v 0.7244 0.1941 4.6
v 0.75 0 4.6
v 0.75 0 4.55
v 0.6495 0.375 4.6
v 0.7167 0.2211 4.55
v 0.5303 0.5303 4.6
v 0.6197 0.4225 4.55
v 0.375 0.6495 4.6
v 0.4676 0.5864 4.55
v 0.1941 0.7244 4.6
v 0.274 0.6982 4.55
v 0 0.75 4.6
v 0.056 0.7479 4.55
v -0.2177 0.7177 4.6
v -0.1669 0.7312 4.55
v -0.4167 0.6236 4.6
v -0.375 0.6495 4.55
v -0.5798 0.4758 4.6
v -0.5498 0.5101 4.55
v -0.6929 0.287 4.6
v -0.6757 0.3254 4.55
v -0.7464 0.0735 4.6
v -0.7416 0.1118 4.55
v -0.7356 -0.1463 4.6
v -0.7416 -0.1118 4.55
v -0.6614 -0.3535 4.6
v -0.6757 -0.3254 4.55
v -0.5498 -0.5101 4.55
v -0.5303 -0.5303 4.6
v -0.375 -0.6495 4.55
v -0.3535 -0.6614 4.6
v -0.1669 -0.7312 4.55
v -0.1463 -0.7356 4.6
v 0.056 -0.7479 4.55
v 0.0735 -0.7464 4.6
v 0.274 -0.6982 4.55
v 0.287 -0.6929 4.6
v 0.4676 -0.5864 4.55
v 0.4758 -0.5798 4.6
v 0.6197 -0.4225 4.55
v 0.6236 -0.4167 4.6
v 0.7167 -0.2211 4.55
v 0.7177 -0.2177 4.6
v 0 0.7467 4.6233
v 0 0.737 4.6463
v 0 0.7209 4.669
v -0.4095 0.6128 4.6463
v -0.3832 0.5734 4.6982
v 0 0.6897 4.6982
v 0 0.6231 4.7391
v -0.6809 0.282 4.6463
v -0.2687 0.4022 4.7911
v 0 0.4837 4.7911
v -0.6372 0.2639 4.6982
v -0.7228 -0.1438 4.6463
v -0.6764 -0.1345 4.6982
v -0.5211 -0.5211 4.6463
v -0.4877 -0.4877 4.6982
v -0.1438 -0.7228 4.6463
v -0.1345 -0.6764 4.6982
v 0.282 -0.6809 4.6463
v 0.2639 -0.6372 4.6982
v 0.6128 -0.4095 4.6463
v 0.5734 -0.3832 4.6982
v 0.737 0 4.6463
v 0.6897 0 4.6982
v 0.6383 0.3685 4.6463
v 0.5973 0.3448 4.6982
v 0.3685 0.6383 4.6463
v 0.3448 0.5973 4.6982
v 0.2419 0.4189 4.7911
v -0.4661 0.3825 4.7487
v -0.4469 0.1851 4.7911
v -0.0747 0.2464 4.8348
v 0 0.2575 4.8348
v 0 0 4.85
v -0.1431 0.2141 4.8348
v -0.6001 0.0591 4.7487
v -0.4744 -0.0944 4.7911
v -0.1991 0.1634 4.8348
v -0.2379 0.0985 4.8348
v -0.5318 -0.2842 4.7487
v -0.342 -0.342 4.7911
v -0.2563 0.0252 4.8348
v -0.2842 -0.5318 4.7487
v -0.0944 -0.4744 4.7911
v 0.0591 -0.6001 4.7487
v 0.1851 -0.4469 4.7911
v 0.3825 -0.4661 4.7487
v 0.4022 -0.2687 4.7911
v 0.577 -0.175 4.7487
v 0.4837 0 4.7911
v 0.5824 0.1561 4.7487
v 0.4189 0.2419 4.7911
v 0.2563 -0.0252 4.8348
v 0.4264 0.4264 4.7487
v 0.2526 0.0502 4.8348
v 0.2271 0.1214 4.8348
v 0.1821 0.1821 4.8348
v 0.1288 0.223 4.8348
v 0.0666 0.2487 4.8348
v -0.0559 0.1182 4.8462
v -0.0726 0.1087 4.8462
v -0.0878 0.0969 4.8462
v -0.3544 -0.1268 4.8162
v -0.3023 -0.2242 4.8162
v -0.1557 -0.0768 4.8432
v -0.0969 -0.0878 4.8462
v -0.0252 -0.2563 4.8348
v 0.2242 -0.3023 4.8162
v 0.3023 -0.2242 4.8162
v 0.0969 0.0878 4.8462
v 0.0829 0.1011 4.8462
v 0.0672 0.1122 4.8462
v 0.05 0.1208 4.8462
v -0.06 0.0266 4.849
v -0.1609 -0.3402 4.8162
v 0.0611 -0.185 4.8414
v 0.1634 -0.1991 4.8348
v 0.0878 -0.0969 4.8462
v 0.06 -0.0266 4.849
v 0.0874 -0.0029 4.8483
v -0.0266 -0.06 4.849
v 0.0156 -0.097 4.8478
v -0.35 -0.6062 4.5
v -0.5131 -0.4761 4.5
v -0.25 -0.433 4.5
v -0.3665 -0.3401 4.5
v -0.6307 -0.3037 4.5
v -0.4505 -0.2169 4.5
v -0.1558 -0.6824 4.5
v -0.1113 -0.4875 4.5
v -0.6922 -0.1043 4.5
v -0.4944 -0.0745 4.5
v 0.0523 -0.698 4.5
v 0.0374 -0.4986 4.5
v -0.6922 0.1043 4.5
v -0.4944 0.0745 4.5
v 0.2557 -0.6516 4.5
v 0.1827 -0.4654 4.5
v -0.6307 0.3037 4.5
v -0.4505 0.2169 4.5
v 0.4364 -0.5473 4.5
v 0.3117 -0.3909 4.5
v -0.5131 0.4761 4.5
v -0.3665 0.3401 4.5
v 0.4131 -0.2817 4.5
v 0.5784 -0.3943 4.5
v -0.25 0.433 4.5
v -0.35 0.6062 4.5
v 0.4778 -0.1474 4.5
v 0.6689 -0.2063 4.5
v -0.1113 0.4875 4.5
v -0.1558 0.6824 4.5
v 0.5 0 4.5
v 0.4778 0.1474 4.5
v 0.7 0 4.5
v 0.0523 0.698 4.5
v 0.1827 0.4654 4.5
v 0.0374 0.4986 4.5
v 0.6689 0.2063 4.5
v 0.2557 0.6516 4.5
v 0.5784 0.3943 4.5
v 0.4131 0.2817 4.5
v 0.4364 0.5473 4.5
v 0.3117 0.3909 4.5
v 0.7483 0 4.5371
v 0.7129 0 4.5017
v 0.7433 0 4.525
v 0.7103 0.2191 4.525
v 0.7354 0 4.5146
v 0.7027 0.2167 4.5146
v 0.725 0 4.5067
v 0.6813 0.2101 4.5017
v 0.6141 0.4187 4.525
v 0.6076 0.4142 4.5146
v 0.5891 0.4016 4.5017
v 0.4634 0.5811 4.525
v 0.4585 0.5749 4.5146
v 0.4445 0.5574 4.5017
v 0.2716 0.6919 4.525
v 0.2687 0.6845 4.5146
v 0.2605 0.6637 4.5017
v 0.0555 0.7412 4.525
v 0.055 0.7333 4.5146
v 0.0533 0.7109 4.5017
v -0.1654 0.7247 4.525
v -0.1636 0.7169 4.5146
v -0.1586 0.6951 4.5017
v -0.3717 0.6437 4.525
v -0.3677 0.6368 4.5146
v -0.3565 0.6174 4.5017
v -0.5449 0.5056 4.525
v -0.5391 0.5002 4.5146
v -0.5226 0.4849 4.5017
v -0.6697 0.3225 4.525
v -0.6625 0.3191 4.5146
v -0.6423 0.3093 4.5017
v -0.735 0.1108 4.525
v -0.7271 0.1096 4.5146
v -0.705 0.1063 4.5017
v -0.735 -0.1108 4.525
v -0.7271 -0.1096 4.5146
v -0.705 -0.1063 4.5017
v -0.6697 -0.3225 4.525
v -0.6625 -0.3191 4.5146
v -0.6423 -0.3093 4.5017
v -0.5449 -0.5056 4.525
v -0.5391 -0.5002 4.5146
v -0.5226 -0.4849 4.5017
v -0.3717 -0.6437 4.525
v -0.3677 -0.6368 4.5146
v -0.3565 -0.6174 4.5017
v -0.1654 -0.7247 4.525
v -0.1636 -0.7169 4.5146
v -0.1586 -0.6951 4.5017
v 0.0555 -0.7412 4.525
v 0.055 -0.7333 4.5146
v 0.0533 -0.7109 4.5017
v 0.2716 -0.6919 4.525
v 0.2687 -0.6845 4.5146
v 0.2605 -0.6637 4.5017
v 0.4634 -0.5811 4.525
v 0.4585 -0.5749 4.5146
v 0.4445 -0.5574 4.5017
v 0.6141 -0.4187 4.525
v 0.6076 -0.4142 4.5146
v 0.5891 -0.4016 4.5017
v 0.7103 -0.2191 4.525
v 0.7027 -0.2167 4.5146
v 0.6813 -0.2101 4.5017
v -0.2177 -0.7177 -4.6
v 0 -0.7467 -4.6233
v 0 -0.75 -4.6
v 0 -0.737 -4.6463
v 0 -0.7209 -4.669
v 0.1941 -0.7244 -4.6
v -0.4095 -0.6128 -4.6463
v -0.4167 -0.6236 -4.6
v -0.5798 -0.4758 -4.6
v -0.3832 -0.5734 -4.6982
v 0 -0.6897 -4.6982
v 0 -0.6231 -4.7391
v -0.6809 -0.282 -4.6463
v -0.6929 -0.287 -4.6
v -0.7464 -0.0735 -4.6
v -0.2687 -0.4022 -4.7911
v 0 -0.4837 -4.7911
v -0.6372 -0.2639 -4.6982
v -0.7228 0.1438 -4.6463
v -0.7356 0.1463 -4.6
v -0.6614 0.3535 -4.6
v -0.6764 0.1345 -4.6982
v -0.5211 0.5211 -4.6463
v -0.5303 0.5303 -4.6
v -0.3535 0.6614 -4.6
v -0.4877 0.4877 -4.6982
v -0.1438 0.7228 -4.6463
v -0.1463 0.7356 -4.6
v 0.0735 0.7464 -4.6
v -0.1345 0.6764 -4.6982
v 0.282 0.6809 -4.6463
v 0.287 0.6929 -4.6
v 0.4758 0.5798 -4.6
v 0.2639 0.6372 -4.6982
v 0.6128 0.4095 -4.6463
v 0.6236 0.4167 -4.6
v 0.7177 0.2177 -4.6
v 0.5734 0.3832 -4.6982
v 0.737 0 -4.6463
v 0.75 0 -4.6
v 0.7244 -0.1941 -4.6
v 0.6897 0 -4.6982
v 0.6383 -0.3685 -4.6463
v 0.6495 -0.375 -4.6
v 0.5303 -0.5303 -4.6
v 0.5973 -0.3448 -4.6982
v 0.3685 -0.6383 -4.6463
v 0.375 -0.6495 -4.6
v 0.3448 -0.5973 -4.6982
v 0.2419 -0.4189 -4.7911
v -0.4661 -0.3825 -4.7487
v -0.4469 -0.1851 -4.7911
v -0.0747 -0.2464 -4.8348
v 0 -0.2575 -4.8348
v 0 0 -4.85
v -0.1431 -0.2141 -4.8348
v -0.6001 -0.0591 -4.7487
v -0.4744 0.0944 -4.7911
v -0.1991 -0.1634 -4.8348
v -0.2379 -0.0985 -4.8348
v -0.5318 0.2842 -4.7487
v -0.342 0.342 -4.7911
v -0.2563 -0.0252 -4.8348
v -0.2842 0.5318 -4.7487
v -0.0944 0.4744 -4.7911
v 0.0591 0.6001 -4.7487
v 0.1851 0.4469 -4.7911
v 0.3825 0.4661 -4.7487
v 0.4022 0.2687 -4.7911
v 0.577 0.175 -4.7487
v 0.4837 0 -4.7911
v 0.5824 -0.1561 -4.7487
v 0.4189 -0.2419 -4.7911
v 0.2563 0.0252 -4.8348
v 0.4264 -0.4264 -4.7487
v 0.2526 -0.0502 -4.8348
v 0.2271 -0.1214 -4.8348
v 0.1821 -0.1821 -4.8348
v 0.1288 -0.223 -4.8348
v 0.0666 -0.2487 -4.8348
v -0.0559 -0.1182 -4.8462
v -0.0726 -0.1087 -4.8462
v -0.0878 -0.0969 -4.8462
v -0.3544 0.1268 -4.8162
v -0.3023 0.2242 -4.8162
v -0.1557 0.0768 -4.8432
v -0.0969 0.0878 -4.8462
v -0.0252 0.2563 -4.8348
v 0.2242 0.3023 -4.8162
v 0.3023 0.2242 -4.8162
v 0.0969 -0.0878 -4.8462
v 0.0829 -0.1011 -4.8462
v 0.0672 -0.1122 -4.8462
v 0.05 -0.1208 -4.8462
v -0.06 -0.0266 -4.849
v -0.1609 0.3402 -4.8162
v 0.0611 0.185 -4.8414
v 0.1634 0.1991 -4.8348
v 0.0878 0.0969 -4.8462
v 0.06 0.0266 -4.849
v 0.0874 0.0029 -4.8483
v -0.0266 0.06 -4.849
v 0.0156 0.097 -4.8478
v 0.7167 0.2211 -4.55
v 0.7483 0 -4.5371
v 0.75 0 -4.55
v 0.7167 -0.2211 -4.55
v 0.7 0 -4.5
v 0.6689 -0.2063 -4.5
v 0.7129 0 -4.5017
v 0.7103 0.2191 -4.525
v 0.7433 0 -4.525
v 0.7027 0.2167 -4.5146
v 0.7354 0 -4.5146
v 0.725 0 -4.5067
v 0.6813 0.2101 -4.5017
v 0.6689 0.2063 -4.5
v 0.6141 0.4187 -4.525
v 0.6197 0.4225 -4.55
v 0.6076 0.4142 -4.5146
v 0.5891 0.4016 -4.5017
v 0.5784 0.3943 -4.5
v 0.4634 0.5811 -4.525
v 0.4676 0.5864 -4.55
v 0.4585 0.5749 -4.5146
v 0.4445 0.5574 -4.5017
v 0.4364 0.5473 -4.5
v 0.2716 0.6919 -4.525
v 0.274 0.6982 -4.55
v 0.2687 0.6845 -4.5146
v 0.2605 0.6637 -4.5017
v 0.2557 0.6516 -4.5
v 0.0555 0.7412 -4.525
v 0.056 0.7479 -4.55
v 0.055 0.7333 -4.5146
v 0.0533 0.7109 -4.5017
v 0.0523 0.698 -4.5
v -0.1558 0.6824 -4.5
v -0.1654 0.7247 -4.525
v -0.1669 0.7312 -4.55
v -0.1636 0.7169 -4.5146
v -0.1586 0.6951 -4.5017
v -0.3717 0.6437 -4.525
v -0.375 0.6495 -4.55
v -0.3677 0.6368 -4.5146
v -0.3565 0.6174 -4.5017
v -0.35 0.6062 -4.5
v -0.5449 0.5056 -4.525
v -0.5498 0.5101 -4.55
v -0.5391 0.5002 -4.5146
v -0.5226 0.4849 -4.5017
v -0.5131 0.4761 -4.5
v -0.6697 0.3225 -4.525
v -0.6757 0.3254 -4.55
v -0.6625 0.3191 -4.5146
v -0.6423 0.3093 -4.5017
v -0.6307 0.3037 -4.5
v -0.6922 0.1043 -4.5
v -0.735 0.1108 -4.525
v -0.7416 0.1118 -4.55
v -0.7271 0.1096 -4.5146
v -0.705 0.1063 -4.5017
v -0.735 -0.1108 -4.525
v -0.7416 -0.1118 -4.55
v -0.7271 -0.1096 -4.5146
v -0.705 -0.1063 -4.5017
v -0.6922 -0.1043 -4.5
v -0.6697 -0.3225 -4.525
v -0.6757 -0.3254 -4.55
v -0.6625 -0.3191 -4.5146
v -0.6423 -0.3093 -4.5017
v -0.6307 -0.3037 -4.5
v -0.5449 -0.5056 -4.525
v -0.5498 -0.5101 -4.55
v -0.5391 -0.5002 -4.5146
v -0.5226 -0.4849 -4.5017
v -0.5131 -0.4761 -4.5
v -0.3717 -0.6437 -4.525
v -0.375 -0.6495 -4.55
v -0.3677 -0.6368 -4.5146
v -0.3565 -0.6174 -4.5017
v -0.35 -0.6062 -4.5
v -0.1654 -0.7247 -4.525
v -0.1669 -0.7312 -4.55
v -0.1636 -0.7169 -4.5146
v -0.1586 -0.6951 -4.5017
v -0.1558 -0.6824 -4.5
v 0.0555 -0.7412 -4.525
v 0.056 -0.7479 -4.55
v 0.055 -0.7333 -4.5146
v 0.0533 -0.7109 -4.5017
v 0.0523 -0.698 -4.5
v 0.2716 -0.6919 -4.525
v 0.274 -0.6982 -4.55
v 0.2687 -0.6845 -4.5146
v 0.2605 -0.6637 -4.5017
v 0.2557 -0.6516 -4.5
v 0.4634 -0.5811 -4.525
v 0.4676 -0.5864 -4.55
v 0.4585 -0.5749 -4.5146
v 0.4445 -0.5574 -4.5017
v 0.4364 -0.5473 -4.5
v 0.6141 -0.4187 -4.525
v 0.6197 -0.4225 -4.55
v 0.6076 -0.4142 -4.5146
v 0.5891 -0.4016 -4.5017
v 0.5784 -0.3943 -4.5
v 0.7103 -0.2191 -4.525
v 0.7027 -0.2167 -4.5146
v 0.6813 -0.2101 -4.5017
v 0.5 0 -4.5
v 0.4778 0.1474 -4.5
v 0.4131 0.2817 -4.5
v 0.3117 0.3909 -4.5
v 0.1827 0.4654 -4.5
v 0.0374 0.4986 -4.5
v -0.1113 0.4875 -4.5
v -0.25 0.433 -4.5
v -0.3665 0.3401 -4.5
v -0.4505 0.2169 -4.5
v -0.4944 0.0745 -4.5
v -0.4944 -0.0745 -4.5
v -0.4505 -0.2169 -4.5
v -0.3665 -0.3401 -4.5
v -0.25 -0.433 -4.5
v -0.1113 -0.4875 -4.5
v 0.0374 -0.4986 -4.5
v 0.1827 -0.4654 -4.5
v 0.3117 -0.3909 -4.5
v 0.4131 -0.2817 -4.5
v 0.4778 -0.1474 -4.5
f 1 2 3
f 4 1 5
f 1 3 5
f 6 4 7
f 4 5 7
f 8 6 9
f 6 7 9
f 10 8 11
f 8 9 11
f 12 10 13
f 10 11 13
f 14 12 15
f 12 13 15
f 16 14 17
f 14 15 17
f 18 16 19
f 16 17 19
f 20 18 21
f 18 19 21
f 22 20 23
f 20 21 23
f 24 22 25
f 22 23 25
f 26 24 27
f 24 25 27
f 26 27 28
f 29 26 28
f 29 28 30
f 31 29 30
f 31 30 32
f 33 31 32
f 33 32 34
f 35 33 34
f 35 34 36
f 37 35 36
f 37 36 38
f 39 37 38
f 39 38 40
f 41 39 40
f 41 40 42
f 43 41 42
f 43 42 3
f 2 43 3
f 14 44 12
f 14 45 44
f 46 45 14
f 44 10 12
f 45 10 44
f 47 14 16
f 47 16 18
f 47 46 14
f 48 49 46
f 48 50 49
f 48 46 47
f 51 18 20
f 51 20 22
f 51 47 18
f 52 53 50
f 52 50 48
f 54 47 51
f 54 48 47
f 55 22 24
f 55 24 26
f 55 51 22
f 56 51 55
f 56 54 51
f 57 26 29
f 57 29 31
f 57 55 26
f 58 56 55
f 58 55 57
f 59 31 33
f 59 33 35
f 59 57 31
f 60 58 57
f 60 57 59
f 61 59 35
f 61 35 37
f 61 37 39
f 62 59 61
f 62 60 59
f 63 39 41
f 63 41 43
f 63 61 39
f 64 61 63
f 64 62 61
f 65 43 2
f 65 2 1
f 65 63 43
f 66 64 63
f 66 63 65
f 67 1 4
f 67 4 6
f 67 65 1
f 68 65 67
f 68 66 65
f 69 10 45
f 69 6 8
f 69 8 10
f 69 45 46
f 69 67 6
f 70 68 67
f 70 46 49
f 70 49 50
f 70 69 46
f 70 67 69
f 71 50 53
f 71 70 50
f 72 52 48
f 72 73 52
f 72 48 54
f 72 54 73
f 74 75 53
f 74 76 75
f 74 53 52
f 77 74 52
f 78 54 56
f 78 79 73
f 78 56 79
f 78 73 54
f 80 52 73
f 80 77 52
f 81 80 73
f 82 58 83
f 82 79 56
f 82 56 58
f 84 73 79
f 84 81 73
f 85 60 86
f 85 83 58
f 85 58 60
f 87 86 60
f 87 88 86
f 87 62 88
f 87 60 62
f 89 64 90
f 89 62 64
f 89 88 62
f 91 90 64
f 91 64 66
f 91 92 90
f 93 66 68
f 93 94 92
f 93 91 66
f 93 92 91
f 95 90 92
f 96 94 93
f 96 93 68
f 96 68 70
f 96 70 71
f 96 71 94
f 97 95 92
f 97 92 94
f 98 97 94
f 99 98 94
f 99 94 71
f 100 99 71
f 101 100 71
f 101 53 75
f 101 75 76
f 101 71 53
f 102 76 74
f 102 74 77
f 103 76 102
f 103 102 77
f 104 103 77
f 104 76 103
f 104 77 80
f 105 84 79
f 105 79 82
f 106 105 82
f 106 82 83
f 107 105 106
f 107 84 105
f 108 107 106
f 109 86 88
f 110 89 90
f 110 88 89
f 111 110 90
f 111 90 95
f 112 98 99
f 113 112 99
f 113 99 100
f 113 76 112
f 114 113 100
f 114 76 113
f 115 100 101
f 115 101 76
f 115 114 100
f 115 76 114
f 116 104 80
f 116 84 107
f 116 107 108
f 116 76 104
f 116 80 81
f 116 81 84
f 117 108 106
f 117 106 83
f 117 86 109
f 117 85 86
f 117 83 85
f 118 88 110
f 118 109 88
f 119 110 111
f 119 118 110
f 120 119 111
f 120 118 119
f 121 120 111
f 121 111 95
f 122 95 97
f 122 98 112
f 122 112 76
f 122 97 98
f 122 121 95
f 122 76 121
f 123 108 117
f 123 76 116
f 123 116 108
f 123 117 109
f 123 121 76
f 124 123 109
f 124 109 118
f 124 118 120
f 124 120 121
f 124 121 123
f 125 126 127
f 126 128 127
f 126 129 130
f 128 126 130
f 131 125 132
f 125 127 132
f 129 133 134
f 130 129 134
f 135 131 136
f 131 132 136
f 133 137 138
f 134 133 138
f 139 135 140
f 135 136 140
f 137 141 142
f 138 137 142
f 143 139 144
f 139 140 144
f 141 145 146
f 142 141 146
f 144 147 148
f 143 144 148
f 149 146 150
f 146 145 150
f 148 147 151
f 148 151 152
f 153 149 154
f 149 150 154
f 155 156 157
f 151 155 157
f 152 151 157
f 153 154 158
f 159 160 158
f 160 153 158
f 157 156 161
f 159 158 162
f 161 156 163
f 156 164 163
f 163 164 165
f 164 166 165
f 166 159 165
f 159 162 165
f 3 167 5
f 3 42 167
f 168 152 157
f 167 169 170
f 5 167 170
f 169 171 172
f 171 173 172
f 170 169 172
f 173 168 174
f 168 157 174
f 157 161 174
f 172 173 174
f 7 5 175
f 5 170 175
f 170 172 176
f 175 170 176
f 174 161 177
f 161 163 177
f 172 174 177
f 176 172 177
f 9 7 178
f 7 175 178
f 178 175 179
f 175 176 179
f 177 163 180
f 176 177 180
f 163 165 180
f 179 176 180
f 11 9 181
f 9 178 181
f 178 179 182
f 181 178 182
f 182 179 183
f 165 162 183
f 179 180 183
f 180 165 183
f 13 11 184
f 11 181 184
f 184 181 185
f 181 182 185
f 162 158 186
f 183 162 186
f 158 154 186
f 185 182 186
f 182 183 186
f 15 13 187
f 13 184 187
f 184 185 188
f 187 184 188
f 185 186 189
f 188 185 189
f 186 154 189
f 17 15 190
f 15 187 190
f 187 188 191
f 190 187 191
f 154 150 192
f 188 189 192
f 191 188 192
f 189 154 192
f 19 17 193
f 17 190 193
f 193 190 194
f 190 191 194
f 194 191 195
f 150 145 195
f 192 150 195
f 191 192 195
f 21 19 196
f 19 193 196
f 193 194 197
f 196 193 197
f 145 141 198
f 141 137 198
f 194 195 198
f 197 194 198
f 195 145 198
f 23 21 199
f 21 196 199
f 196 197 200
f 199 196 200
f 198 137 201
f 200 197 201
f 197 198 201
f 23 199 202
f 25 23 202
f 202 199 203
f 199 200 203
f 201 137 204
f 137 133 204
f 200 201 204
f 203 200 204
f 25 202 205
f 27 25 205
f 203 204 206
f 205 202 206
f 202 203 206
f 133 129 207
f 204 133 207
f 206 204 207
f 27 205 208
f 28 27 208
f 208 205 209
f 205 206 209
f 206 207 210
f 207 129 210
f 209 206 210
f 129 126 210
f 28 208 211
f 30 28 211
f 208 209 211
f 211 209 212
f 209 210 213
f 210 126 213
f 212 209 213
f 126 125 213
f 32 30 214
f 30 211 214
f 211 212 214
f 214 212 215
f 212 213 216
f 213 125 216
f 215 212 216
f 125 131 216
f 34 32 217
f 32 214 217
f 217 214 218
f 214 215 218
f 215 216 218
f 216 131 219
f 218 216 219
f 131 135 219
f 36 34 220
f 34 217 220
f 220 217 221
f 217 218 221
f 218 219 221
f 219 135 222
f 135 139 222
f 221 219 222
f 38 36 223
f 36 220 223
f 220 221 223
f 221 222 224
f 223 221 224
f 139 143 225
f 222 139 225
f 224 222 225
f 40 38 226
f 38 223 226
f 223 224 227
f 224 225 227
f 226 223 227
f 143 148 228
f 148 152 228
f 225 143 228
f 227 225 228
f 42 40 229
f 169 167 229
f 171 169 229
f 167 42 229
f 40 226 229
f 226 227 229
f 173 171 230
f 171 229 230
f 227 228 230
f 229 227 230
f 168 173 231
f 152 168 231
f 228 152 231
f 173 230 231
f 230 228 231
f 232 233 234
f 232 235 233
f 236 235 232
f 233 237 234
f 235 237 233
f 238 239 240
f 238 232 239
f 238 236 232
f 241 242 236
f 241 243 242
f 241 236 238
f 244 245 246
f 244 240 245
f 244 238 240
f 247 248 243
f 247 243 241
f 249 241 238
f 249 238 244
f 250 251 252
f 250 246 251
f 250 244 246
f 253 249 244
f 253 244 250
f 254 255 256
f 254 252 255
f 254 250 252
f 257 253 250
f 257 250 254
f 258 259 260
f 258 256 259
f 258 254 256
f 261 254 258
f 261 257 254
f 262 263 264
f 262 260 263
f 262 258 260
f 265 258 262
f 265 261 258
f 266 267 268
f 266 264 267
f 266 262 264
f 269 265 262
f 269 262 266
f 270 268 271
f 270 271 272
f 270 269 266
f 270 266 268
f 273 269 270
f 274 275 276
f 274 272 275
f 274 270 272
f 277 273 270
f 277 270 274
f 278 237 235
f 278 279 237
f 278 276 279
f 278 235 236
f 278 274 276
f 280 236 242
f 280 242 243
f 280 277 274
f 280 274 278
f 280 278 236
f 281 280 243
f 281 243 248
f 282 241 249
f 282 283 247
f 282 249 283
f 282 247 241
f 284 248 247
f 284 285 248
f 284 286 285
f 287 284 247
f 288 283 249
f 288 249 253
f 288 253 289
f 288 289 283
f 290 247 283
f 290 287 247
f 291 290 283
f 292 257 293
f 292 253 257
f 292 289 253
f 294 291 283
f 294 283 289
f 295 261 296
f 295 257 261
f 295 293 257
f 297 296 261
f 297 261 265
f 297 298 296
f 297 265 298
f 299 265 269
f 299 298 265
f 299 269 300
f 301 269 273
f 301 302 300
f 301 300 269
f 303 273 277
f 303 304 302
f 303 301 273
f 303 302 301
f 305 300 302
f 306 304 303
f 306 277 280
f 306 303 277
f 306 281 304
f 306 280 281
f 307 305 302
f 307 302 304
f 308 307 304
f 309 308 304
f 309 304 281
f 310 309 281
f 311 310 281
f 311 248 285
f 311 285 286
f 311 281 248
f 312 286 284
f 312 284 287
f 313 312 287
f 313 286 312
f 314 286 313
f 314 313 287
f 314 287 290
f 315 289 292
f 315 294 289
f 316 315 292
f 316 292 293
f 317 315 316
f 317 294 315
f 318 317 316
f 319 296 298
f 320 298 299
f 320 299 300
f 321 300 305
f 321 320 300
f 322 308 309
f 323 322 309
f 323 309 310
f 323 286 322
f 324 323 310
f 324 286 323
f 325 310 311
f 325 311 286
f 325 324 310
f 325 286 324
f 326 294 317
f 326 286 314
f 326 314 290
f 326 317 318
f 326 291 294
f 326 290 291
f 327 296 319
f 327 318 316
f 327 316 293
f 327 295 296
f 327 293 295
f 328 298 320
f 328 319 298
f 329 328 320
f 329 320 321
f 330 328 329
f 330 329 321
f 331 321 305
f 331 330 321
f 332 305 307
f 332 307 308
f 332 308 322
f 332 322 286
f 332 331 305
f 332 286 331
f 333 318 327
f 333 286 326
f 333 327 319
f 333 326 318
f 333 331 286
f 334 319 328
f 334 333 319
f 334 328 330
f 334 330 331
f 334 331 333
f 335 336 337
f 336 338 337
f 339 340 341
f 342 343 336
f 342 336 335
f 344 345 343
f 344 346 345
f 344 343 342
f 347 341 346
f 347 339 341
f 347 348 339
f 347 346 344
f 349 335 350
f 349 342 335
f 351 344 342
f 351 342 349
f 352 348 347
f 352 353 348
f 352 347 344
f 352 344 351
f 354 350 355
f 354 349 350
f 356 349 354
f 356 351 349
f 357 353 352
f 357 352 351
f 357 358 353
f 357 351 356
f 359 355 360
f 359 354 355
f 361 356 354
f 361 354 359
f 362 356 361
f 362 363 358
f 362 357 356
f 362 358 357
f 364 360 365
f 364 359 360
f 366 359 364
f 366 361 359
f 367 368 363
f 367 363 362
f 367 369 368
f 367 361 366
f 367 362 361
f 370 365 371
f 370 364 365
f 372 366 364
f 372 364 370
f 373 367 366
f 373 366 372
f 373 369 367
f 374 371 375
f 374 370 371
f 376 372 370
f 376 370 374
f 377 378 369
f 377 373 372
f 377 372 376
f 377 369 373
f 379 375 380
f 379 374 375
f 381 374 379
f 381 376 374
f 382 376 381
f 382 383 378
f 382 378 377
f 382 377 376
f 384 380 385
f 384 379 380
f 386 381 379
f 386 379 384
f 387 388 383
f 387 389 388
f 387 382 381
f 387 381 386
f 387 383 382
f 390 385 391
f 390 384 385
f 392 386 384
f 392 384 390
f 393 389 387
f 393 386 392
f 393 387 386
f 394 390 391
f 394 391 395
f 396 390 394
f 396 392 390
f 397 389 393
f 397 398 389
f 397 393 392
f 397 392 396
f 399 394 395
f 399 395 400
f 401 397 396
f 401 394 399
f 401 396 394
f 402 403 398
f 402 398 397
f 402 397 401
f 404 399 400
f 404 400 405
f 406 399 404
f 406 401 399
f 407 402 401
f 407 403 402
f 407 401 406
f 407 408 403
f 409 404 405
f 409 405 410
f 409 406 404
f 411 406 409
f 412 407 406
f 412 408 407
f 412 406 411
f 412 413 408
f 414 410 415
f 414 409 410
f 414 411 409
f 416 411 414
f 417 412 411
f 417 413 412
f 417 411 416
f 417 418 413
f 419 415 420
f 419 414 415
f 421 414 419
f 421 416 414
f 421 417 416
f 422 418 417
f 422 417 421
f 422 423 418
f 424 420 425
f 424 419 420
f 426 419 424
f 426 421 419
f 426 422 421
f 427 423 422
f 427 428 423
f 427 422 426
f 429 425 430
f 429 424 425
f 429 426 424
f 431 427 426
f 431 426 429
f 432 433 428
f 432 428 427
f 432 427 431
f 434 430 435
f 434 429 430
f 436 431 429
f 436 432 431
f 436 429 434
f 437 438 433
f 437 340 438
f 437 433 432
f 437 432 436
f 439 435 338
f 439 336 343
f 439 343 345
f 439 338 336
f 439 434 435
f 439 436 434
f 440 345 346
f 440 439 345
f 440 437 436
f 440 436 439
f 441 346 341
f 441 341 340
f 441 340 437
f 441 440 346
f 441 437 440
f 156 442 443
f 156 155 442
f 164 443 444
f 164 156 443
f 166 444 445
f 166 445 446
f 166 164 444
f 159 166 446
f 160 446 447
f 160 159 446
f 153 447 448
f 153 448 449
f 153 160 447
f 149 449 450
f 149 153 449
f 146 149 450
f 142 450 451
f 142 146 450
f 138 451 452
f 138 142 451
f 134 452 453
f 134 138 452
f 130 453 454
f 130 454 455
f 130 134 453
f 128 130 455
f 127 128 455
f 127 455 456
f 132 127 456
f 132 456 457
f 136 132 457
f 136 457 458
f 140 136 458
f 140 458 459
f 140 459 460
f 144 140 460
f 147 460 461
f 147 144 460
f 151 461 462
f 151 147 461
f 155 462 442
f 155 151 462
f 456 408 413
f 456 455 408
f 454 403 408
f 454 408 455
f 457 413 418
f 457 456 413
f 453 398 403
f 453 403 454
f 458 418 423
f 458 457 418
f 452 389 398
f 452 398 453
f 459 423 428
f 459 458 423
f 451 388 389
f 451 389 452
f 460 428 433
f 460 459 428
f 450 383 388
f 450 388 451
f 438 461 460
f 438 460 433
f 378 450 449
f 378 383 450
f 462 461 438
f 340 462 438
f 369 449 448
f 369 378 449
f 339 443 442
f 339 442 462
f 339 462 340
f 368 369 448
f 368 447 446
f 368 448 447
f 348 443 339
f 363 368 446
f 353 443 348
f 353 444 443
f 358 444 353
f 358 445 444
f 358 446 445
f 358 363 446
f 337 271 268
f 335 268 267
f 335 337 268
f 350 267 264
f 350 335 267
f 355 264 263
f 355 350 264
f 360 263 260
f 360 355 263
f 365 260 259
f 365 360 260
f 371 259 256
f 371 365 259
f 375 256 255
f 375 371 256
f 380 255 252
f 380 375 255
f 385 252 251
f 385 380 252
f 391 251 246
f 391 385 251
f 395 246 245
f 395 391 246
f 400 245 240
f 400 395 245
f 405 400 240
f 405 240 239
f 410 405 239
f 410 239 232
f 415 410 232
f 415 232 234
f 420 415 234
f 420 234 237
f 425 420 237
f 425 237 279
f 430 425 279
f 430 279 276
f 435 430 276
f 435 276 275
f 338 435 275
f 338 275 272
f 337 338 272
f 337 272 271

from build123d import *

# Parameters (mm, degrees)
SKETCH1_R                  = 0.5
BOSS_EXTRUDE1_DEPTH        = 4.5
SKETCH2_R                  = 0.75
BOSS_EXTRUDE2_DEPTH        = 0.1
DOME1_FACE_RADIUS          = 0.75
DOME1_HEIGHT               = 0.25
FILLET1_R                  = 0.05
MIRROR2_COPY_1_FACE_RADIUS = 0.75
MIRROR2_COPY_1_HEIGHT      = 0.25
FILLET1_OF_MIRROR2_R       = 0.05


with BuildPart() as part:
    # Sketch1 → Boss-Extrude1 (new, symmetric)
    with BuildSketch(Plane.XY):
        Circle(SKETCH1_R)
    extrude(amount=BOSS_EXTRUDE1_DEPTH, both=True)

    # Sketch2 → Boss-Extrude2 (add)
    with BuildSketch(Plane.XY.offset(4.5)):
        Circle(SKETCH2_R)
    boss_extrude2 = extrude(amount=BOSS_EXTRUDE2_DEPTH)

    # Dome1: an elliptical dome of height H over a round flat face of radius A is half a spheroid: the quarter ellipse of half axes A and H revolved about the face's axis
    with BuildSketch(Plane((0, 0, 4.6), x_dir=(0, 1, 0), z_dir=(1, 0, 0)), mode=Mode.PRIVATE) as dome1_quarter:
        Ellipse(DOME1_FACE_RADIUS, DOME1_HEIGHT)
        Rectangle(DOME1_FACE_RADIUS, DOME1_HEIGHT, align=(Align.MIN, Align.MIN), mode=Mode.INTERSECT)
    revolve(dome1_quarter.sketch, axis=Axis((0, 0, 4.6), (0, 0, 1)))

    # Fillet1
    fillet1_edges = [part.edges().sort_by_distance(p)[0] for p in [
        (-0.75, 0, 4.5),
    ]]
    fillet(fillet1_edges, radius=FILLET1_R)

    # Mirror2: Boss-Extrude2 across plane
    add(boss_extrude2.mirror(Plane.XY))

    # Mirror2 copy 1: an elliptical dome of height H over a round flat face of radius A is half a spheroid: the quarter ellipse of half axes A and H revolved about the face's axis
    with BuildSketch(Plane((0, 0, -4.6), x_dir=(0, -1, 0), z_dir=(1, 0, 0)), mode=Mode.PRIVATE) as mirror2_copy_1_quarter:
        Ellipse(MIRROR2_COPY_1_FACE_RADIUS, MIRROR2_COPY_1_HEIGHT)
        Rectangle(MIRROR2_COPY_1_FACE_RADIUS, MIRROR2_COPY_1_HEIGHT, align=(Align.MIN, Align.MIN), mode=Mode.INTERSECT)
    revolve(mirror2_copy_1_quarter.sketch, axis=Axis((0, 0, -4.6), (0, 0, -1)))

    # Fillet1 of Mirror2
    fillet1_of_mirror2_edges = [part.edges().sort_by_distance(p)[0] for p in [
        (-0.75, 0, -4.5),
    ]]
    fillet(fillet1_of_mirror2_edges, radius=FILLET1_OF_MIRROR2_R)


solid = part.part
